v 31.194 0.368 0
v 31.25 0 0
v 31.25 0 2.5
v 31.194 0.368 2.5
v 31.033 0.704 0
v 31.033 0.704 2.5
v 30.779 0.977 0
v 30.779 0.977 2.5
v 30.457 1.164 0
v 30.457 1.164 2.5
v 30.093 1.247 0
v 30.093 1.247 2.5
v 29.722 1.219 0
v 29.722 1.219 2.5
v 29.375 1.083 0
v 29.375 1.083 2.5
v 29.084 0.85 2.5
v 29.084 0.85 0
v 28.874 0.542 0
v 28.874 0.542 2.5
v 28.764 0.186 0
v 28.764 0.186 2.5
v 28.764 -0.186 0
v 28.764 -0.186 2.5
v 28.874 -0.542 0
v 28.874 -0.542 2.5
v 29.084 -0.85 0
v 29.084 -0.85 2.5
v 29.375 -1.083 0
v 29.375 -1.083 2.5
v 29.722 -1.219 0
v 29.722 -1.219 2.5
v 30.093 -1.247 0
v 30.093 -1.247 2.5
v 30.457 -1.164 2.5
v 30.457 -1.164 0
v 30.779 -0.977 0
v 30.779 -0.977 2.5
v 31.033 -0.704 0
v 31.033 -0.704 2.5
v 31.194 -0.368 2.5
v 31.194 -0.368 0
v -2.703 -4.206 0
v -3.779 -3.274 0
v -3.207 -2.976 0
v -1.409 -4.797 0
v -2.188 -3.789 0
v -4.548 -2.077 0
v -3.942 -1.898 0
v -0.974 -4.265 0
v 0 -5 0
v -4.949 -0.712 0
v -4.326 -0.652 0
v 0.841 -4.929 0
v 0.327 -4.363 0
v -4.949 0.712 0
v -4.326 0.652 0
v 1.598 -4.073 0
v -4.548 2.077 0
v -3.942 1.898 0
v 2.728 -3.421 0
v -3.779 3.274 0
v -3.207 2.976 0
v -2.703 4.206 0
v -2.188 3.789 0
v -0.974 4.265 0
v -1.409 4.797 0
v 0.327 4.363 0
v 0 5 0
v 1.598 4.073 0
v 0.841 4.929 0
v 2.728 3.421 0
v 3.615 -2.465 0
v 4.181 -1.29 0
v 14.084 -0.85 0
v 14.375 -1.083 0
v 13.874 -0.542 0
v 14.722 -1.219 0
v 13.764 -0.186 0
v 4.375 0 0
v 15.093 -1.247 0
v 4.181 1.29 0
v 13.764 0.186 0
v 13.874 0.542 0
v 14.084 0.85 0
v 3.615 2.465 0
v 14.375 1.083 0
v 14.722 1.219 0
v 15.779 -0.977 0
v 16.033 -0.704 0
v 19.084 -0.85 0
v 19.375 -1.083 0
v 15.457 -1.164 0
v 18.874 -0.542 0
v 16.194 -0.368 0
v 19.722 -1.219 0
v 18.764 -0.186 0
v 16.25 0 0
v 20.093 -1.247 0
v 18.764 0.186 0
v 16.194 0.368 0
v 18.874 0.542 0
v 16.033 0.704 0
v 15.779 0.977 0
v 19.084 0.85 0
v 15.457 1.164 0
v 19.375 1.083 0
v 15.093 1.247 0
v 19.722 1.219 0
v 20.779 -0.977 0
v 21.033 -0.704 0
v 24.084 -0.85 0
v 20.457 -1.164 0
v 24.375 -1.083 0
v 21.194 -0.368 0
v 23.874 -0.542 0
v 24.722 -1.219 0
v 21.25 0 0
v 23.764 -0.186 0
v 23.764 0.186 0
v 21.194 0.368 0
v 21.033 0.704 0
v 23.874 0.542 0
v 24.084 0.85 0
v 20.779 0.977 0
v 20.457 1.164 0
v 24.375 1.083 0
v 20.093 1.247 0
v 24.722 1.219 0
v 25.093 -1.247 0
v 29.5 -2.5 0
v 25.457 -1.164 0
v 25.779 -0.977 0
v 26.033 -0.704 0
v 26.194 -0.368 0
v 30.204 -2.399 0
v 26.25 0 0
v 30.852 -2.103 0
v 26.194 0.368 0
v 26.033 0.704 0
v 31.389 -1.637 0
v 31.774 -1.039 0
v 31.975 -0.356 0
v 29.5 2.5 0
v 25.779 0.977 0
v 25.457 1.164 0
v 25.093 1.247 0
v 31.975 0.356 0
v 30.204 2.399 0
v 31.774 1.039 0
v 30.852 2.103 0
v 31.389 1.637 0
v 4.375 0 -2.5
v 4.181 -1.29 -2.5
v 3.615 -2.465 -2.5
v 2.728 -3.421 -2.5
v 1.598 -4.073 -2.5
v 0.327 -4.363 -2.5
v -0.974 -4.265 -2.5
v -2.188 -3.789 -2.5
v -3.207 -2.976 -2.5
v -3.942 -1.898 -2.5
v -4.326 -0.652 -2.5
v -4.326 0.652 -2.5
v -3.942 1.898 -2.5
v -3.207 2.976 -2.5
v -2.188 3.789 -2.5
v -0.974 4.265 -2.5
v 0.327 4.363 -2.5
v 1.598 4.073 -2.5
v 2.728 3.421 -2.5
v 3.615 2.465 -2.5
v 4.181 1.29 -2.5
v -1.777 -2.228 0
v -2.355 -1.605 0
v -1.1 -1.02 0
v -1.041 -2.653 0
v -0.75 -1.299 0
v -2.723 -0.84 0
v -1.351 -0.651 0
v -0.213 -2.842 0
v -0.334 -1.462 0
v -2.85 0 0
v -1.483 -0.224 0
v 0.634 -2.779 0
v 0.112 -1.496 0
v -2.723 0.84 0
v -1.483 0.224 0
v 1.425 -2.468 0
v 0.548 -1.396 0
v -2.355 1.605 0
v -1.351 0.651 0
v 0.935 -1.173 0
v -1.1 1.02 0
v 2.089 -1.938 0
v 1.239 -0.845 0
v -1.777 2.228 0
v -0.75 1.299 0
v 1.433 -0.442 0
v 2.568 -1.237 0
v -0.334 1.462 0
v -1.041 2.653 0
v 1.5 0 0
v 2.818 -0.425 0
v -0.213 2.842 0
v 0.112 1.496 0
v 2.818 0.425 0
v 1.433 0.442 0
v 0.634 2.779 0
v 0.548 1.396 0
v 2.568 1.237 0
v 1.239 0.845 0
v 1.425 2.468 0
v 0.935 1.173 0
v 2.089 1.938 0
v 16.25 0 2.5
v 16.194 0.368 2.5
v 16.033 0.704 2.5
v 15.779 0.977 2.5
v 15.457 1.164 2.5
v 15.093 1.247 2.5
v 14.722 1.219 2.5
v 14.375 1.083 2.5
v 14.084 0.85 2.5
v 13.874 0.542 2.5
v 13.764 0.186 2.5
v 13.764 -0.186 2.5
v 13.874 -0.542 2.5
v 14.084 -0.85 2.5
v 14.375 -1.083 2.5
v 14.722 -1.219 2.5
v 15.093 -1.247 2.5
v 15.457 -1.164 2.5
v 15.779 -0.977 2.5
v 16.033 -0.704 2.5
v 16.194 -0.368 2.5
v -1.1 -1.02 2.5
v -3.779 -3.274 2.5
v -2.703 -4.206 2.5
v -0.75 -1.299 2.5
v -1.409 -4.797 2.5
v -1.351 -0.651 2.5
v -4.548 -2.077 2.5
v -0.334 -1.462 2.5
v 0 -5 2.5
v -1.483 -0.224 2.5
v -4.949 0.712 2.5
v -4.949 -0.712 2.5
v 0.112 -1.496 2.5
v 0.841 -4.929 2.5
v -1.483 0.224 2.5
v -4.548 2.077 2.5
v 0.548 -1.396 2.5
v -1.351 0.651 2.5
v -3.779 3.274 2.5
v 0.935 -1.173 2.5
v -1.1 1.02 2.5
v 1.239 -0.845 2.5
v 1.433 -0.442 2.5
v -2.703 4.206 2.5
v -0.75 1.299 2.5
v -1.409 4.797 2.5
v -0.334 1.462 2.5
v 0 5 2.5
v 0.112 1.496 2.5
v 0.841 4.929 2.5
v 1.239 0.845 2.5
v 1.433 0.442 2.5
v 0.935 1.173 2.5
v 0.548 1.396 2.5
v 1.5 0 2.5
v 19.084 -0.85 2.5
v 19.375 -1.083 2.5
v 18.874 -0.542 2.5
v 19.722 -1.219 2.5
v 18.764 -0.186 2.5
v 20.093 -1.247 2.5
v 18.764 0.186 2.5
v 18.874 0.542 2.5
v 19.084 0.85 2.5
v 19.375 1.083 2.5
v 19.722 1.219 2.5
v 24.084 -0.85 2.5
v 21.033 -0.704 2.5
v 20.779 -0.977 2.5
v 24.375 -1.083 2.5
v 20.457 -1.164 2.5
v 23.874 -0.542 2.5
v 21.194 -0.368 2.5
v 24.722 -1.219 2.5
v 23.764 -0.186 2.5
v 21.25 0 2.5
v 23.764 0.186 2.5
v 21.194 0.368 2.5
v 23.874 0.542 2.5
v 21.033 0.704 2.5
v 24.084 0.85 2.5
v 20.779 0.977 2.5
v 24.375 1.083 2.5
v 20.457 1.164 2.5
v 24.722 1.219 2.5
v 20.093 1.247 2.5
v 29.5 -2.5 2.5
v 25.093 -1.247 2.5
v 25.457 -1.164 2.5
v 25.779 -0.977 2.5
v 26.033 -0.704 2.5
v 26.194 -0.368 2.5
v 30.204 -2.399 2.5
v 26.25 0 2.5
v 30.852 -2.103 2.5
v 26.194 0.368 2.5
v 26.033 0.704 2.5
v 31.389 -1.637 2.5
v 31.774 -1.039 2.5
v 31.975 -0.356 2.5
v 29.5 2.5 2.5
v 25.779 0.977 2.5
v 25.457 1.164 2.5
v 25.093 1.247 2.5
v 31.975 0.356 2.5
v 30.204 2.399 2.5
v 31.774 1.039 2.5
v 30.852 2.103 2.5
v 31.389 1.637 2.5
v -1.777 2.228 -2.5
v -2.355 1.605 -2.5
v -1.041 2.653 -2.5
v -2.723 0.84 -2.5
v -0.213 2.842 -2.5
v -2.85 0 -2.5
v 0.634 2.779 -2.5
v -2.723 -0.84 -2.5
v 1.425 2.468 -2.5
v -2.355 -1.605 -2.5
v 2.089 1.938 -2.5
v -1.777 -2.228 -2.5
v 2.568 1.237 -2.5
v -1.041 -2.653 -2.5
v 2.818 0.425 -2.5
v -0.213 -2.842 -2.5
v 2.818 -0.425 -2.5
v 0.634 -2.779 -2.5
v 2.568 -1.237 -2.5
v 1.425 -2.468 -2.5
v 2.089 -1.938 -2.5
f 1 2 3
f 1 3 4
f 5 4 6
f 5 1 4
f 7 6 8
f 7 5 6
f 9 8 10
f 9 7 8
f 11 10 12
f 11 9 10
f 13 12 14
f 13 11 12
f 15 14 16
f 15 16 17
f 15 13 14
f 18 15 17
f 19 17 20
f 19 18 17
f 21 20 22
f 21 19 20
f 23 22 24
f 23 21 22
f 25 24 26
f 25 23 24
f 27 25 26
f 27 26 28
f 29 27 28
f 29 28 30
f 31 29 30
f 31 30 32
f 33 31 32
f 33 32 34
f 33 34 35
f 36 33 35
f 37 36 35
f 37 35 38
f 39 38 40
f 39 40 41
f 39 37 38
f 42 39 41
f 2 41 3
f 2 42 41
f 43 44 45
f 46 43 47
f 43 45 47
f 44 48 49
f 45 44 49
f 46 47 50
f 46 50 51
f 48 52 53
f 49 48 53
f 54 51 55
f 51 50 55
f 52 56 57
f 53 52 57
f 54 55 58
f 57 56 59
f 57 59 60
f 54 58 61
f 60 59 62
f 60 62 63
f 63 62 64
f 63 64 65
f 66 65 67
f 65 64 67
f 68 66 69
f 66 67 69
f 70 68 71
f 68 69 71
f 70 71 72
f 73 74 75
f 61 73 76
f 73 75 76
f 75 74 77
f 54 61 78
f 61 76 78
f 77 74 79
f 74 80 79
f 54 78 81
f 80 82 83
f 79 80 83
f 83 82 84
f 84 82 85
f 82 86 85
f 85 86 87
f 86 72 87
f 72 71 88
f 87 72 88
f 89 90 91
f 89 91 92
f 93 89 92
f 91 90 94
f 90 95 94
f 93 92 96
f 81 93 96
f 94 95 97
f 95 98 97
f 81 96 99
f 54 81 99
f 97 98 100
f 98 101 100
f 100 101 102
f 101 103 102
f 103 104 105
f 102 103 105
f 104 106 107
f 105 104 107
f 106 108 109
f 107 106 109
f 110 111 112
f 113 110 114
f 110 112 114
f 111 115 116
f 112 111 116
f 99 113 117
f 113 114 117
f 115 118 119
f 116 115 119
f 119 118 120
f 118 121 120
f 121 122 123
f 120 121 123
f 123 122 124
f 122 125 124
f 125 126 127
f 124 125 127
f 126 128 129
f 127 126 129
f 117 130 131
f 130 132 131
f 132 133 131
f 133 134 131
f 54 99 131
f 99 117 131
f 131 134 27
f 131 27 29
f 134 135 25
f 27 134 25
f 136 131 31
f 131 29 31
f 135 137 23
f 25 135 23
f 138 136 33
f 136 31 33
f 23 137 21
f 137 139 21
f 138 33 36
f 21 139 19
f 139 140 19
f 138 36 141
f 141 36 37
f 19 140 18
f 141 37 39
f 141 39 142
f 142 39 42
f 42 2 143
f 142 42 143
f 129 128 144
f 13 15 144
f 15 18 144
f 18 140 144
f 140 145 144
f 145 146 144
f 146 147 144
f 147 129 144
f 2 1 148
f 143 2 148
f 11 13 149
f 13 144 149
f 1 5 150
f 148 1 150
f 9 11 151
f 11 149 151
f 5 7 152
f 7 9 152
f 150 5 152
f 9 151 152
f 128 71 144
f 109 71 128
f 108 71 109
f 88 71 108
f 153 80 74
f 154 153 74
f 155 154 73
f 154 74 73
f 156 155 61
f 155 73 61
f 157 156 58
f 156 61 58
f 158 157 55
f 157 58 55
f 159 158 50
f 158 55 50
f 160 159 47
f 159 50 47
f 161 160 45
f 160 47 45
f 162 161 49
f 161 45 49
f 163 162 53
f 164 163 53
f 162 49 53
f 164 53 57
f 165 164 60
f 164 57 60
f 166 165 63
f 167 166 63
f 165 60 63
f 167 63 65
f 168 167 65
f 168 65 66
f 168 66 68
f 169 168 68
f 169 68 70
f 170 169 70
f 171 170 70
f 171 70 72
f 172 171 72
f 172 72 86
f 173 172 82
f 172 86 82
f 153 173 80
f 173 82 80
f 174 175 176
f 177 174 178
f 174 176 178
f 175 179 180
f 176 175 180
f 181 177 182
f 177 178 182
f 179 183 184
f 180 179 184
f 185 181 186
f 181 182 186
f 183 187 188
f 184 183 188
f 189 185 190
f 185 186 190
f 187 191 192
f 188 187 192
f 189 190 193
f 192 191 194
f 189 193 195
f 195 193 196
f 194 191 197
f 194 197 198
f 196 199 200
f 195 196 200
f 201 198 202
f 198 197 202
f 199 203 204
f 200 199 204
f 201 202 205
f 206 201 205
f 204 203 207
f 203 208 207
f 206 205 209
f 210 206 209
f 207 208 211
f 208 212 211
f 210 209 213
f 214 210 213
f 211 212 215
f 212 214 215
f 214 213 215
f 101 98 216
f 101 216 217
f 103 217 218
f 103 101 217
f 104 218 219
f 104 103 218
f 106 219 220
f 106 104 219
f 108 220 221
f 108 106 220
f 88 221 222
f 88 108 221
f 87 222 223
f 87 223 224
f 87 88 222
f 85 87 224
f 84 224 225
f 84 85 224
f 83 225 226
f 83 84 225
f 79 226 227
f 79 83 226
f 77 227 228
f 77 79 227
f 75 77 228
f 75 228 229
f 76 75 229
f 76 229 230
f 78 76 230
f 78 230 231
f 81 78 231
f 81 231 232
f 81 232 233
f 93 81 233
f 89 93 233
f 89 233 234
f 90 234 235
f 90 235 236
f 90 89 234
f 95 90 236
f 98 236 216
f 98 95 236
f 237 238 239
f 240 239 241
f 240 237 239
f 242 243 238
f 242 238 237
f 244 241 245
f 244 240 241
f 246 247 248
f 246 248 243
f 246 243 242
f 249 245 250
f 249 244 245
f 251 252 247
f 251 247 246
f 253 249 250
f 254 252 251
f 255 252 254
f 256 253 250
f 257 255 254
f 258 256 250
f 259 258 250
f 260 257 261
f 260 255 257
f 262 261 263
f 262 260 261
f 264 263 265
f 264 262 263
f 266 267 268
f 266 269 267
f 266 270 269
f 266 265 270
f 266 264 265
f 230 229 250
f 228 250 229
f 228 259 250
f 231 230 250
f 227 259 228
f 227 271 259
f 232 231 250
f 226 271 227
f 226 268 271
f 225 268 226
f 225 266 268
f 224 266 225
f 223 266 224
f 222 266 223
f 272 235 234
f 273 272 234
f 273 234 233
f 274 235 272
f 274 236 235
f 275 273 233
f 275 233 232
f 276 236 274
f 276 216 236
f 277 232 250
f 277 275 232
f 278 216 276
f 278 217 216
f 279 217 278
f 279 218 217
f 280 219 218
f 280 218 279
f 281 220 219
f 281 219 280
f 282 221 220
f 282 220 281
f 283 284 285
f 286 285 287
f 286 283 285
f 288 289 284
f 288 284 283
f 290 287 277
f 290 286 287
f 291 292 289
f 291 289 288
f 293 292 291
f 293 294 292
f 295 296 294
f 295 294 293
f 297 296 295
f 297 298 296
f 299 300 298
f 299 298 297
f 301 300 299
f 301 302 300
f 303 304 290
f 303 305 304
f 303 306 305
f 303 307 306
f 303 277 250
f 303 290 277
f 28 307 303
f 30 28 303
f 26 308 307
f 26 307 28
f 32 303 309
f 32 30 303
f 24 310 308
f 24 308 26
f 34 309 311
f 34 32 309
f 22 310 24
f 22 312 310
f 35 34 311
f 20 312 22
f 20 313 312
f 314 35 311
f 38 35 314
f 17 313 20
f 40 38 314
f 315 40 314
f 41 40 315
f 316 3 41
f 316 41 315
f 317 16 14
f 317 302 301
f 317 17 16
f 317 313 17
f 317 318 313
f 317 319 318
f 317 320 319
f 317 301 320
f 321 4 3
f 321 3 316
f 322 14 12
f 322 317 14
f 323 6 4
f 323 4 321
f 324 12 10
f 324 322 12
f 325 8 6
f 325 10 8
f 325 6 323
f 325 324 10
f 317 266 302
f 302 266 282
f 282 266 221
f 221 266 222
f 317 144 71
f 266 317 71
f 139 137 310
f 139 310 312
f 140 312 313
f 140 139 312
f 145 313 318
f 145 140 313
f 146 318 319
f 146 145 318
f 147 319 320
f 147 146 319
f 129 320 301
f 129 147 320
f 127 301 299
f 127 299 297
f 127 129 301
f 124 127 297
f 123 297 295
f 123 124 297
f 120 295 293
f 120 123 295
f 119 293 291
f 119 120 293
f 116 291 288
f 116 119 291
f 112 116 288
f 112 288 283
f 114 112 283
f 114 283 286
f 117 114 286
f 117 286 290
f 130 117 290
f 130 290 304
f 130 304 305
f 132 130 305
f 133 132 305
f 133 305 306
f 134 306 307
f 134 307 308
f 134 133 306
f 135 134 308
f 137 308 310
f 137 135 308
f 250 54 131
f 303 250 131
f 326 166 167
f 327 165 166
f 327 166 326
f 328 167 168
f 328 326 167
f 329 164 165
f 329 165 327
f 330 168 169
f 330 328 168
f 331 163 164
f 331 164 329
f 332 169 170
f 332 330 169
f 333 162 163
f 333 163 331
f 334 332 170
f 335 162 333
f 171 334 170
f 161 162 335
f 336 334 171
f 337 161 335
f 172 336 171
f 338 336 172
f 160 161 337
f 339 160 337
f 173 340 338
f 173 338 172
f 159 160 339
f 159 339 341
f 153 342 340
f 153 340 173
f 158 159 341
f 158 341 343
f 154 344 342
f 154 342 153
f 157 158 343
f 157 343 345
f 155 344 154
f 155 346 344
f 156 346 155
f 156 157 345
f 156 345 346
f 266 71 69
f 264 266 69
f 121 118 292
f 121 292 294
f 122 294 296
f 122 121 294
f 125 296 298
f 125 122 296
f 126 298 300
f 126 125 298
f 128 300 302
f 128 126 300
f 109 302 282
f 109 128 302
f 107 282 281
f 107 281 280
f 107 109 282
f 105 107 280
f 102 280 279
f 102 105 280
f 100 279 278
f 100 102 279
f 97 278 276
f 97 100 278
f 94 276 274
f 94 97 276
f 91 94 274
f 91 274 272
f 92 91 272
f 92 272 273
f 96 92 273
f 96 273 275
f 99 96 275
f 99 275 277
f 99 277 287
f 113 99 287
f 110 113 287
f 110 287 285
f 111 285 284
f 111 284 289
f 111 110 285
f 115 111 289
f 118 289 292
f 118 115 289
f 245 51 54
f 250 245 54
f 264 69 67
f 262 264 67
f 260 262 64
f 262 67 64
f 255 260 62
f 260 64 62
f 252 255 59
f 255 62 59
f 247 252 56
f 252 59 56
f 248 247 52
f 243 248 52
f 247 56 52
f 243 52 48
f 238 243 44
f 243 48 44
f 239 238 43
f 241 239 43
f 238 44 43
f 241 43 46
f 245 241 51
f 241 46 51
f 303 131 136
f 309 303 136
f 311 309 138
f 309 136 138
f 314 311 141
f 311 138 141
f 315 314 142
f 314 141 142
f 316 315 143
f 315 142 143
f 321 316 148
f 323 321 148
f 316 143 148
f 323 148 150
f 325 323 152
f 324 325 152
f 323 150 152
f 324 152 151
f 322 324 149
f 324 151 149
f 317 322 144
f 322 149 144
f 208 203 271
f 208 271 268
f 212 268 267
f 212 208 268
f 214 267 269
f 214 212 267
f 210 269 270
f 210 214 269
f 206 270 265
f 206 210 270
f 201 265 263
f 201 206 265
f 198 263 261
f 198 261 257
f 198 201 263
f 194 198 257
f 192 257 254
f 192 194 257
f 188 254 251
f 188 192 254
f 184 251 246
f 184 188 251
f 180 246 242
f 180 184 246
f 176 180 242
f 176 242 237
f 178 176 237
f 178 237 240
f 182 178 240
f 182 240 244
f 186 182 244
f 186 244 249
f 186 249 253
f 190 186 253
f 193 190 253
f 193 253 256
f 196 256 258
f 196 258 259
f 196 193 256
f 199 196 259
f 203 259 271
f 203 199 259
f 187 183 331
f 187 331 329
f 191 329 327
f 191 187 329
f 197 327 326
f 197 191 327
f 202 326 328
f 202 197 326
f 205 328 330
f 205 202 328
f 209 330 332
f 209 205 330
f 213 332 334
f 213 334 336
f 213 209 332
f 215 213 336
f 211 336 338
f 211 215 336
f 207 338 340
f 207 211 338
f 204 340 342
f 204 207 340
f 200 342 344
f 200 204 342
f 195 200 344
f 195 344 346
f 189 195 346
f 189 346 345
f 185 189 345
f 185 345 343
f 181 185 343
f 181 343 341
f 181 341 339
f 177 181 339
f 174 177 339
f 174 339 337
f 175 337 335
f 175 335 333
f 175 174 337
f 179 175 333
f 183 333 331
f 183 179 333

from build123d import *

# Parameters (mm, degrees)
SKETCH1_R           = 1.5
SKETCH1_R_2         = 1.25
BOSS_EXTRUDE1_DEPTH = 2.5
SKETCH2_R           = 4.375
SKETCH2_R_2         = 2.85
BOSS_EXTRUDE2_DEPTH = 2.5


with BuildPart() as part:
    # Sketch1 → Boss-Extrude1 (new body)
    with BuildSketch(Plane.XY):
        with BuildLine():
            Line((0.841414718, 4.928693668), (0, 5))
            ThreePointArc((0, 5), (-5, 0), (0, -5))
            Line((0, -5), (0.841414718, -4.928693668))
            Line((0.841414718, -4.928693668), (29.5, -2.5))
            ThreePointArc((29.5, -2.5), (32, 0), (29.5, 2.5))
            Line((29.5, 2.5), (0.841414718, 4.928693668))
        make_face()
        Circle(SKETCH1_R, mode=Mode.SUBTRACT)
        with Locations((15, 0)):
            Circle(SKETCH1_R_2, mode=Mode.SUBTRACT)
        with Locations((20, 0)):
            Circle(SKETCH1_R_2, mode=Mode.SUBTRACT)
        with Locations((25, 0)):
            Circle(SKETCH1_R_2, mode=Mode.SUBTRACT)
        with Locations((30, 0)):
            Circle(SKETCH1_R_2, mode=Mode.SUBTRACT)
    extrude(amount=BOSS_EXTRUDE1_DEPTH)

    # Sketch2 → Boss-Extrude2 (add)
    with BuildSketch(Plane(origin=(0, 0, 0), x_dir=(-1, 0, 0), z_dir=(0, 0, -1))):
        with Locations(Location((0, 0, 0), (0, 0, 180))):
            Circle(SKETCH2_R)
        Circle(SKETCH2_R_2, mode=Mode.SUBTRACT)
    extrude(amount=BOSS_EXTRUDE2_DEPTH)


solid = part.part
